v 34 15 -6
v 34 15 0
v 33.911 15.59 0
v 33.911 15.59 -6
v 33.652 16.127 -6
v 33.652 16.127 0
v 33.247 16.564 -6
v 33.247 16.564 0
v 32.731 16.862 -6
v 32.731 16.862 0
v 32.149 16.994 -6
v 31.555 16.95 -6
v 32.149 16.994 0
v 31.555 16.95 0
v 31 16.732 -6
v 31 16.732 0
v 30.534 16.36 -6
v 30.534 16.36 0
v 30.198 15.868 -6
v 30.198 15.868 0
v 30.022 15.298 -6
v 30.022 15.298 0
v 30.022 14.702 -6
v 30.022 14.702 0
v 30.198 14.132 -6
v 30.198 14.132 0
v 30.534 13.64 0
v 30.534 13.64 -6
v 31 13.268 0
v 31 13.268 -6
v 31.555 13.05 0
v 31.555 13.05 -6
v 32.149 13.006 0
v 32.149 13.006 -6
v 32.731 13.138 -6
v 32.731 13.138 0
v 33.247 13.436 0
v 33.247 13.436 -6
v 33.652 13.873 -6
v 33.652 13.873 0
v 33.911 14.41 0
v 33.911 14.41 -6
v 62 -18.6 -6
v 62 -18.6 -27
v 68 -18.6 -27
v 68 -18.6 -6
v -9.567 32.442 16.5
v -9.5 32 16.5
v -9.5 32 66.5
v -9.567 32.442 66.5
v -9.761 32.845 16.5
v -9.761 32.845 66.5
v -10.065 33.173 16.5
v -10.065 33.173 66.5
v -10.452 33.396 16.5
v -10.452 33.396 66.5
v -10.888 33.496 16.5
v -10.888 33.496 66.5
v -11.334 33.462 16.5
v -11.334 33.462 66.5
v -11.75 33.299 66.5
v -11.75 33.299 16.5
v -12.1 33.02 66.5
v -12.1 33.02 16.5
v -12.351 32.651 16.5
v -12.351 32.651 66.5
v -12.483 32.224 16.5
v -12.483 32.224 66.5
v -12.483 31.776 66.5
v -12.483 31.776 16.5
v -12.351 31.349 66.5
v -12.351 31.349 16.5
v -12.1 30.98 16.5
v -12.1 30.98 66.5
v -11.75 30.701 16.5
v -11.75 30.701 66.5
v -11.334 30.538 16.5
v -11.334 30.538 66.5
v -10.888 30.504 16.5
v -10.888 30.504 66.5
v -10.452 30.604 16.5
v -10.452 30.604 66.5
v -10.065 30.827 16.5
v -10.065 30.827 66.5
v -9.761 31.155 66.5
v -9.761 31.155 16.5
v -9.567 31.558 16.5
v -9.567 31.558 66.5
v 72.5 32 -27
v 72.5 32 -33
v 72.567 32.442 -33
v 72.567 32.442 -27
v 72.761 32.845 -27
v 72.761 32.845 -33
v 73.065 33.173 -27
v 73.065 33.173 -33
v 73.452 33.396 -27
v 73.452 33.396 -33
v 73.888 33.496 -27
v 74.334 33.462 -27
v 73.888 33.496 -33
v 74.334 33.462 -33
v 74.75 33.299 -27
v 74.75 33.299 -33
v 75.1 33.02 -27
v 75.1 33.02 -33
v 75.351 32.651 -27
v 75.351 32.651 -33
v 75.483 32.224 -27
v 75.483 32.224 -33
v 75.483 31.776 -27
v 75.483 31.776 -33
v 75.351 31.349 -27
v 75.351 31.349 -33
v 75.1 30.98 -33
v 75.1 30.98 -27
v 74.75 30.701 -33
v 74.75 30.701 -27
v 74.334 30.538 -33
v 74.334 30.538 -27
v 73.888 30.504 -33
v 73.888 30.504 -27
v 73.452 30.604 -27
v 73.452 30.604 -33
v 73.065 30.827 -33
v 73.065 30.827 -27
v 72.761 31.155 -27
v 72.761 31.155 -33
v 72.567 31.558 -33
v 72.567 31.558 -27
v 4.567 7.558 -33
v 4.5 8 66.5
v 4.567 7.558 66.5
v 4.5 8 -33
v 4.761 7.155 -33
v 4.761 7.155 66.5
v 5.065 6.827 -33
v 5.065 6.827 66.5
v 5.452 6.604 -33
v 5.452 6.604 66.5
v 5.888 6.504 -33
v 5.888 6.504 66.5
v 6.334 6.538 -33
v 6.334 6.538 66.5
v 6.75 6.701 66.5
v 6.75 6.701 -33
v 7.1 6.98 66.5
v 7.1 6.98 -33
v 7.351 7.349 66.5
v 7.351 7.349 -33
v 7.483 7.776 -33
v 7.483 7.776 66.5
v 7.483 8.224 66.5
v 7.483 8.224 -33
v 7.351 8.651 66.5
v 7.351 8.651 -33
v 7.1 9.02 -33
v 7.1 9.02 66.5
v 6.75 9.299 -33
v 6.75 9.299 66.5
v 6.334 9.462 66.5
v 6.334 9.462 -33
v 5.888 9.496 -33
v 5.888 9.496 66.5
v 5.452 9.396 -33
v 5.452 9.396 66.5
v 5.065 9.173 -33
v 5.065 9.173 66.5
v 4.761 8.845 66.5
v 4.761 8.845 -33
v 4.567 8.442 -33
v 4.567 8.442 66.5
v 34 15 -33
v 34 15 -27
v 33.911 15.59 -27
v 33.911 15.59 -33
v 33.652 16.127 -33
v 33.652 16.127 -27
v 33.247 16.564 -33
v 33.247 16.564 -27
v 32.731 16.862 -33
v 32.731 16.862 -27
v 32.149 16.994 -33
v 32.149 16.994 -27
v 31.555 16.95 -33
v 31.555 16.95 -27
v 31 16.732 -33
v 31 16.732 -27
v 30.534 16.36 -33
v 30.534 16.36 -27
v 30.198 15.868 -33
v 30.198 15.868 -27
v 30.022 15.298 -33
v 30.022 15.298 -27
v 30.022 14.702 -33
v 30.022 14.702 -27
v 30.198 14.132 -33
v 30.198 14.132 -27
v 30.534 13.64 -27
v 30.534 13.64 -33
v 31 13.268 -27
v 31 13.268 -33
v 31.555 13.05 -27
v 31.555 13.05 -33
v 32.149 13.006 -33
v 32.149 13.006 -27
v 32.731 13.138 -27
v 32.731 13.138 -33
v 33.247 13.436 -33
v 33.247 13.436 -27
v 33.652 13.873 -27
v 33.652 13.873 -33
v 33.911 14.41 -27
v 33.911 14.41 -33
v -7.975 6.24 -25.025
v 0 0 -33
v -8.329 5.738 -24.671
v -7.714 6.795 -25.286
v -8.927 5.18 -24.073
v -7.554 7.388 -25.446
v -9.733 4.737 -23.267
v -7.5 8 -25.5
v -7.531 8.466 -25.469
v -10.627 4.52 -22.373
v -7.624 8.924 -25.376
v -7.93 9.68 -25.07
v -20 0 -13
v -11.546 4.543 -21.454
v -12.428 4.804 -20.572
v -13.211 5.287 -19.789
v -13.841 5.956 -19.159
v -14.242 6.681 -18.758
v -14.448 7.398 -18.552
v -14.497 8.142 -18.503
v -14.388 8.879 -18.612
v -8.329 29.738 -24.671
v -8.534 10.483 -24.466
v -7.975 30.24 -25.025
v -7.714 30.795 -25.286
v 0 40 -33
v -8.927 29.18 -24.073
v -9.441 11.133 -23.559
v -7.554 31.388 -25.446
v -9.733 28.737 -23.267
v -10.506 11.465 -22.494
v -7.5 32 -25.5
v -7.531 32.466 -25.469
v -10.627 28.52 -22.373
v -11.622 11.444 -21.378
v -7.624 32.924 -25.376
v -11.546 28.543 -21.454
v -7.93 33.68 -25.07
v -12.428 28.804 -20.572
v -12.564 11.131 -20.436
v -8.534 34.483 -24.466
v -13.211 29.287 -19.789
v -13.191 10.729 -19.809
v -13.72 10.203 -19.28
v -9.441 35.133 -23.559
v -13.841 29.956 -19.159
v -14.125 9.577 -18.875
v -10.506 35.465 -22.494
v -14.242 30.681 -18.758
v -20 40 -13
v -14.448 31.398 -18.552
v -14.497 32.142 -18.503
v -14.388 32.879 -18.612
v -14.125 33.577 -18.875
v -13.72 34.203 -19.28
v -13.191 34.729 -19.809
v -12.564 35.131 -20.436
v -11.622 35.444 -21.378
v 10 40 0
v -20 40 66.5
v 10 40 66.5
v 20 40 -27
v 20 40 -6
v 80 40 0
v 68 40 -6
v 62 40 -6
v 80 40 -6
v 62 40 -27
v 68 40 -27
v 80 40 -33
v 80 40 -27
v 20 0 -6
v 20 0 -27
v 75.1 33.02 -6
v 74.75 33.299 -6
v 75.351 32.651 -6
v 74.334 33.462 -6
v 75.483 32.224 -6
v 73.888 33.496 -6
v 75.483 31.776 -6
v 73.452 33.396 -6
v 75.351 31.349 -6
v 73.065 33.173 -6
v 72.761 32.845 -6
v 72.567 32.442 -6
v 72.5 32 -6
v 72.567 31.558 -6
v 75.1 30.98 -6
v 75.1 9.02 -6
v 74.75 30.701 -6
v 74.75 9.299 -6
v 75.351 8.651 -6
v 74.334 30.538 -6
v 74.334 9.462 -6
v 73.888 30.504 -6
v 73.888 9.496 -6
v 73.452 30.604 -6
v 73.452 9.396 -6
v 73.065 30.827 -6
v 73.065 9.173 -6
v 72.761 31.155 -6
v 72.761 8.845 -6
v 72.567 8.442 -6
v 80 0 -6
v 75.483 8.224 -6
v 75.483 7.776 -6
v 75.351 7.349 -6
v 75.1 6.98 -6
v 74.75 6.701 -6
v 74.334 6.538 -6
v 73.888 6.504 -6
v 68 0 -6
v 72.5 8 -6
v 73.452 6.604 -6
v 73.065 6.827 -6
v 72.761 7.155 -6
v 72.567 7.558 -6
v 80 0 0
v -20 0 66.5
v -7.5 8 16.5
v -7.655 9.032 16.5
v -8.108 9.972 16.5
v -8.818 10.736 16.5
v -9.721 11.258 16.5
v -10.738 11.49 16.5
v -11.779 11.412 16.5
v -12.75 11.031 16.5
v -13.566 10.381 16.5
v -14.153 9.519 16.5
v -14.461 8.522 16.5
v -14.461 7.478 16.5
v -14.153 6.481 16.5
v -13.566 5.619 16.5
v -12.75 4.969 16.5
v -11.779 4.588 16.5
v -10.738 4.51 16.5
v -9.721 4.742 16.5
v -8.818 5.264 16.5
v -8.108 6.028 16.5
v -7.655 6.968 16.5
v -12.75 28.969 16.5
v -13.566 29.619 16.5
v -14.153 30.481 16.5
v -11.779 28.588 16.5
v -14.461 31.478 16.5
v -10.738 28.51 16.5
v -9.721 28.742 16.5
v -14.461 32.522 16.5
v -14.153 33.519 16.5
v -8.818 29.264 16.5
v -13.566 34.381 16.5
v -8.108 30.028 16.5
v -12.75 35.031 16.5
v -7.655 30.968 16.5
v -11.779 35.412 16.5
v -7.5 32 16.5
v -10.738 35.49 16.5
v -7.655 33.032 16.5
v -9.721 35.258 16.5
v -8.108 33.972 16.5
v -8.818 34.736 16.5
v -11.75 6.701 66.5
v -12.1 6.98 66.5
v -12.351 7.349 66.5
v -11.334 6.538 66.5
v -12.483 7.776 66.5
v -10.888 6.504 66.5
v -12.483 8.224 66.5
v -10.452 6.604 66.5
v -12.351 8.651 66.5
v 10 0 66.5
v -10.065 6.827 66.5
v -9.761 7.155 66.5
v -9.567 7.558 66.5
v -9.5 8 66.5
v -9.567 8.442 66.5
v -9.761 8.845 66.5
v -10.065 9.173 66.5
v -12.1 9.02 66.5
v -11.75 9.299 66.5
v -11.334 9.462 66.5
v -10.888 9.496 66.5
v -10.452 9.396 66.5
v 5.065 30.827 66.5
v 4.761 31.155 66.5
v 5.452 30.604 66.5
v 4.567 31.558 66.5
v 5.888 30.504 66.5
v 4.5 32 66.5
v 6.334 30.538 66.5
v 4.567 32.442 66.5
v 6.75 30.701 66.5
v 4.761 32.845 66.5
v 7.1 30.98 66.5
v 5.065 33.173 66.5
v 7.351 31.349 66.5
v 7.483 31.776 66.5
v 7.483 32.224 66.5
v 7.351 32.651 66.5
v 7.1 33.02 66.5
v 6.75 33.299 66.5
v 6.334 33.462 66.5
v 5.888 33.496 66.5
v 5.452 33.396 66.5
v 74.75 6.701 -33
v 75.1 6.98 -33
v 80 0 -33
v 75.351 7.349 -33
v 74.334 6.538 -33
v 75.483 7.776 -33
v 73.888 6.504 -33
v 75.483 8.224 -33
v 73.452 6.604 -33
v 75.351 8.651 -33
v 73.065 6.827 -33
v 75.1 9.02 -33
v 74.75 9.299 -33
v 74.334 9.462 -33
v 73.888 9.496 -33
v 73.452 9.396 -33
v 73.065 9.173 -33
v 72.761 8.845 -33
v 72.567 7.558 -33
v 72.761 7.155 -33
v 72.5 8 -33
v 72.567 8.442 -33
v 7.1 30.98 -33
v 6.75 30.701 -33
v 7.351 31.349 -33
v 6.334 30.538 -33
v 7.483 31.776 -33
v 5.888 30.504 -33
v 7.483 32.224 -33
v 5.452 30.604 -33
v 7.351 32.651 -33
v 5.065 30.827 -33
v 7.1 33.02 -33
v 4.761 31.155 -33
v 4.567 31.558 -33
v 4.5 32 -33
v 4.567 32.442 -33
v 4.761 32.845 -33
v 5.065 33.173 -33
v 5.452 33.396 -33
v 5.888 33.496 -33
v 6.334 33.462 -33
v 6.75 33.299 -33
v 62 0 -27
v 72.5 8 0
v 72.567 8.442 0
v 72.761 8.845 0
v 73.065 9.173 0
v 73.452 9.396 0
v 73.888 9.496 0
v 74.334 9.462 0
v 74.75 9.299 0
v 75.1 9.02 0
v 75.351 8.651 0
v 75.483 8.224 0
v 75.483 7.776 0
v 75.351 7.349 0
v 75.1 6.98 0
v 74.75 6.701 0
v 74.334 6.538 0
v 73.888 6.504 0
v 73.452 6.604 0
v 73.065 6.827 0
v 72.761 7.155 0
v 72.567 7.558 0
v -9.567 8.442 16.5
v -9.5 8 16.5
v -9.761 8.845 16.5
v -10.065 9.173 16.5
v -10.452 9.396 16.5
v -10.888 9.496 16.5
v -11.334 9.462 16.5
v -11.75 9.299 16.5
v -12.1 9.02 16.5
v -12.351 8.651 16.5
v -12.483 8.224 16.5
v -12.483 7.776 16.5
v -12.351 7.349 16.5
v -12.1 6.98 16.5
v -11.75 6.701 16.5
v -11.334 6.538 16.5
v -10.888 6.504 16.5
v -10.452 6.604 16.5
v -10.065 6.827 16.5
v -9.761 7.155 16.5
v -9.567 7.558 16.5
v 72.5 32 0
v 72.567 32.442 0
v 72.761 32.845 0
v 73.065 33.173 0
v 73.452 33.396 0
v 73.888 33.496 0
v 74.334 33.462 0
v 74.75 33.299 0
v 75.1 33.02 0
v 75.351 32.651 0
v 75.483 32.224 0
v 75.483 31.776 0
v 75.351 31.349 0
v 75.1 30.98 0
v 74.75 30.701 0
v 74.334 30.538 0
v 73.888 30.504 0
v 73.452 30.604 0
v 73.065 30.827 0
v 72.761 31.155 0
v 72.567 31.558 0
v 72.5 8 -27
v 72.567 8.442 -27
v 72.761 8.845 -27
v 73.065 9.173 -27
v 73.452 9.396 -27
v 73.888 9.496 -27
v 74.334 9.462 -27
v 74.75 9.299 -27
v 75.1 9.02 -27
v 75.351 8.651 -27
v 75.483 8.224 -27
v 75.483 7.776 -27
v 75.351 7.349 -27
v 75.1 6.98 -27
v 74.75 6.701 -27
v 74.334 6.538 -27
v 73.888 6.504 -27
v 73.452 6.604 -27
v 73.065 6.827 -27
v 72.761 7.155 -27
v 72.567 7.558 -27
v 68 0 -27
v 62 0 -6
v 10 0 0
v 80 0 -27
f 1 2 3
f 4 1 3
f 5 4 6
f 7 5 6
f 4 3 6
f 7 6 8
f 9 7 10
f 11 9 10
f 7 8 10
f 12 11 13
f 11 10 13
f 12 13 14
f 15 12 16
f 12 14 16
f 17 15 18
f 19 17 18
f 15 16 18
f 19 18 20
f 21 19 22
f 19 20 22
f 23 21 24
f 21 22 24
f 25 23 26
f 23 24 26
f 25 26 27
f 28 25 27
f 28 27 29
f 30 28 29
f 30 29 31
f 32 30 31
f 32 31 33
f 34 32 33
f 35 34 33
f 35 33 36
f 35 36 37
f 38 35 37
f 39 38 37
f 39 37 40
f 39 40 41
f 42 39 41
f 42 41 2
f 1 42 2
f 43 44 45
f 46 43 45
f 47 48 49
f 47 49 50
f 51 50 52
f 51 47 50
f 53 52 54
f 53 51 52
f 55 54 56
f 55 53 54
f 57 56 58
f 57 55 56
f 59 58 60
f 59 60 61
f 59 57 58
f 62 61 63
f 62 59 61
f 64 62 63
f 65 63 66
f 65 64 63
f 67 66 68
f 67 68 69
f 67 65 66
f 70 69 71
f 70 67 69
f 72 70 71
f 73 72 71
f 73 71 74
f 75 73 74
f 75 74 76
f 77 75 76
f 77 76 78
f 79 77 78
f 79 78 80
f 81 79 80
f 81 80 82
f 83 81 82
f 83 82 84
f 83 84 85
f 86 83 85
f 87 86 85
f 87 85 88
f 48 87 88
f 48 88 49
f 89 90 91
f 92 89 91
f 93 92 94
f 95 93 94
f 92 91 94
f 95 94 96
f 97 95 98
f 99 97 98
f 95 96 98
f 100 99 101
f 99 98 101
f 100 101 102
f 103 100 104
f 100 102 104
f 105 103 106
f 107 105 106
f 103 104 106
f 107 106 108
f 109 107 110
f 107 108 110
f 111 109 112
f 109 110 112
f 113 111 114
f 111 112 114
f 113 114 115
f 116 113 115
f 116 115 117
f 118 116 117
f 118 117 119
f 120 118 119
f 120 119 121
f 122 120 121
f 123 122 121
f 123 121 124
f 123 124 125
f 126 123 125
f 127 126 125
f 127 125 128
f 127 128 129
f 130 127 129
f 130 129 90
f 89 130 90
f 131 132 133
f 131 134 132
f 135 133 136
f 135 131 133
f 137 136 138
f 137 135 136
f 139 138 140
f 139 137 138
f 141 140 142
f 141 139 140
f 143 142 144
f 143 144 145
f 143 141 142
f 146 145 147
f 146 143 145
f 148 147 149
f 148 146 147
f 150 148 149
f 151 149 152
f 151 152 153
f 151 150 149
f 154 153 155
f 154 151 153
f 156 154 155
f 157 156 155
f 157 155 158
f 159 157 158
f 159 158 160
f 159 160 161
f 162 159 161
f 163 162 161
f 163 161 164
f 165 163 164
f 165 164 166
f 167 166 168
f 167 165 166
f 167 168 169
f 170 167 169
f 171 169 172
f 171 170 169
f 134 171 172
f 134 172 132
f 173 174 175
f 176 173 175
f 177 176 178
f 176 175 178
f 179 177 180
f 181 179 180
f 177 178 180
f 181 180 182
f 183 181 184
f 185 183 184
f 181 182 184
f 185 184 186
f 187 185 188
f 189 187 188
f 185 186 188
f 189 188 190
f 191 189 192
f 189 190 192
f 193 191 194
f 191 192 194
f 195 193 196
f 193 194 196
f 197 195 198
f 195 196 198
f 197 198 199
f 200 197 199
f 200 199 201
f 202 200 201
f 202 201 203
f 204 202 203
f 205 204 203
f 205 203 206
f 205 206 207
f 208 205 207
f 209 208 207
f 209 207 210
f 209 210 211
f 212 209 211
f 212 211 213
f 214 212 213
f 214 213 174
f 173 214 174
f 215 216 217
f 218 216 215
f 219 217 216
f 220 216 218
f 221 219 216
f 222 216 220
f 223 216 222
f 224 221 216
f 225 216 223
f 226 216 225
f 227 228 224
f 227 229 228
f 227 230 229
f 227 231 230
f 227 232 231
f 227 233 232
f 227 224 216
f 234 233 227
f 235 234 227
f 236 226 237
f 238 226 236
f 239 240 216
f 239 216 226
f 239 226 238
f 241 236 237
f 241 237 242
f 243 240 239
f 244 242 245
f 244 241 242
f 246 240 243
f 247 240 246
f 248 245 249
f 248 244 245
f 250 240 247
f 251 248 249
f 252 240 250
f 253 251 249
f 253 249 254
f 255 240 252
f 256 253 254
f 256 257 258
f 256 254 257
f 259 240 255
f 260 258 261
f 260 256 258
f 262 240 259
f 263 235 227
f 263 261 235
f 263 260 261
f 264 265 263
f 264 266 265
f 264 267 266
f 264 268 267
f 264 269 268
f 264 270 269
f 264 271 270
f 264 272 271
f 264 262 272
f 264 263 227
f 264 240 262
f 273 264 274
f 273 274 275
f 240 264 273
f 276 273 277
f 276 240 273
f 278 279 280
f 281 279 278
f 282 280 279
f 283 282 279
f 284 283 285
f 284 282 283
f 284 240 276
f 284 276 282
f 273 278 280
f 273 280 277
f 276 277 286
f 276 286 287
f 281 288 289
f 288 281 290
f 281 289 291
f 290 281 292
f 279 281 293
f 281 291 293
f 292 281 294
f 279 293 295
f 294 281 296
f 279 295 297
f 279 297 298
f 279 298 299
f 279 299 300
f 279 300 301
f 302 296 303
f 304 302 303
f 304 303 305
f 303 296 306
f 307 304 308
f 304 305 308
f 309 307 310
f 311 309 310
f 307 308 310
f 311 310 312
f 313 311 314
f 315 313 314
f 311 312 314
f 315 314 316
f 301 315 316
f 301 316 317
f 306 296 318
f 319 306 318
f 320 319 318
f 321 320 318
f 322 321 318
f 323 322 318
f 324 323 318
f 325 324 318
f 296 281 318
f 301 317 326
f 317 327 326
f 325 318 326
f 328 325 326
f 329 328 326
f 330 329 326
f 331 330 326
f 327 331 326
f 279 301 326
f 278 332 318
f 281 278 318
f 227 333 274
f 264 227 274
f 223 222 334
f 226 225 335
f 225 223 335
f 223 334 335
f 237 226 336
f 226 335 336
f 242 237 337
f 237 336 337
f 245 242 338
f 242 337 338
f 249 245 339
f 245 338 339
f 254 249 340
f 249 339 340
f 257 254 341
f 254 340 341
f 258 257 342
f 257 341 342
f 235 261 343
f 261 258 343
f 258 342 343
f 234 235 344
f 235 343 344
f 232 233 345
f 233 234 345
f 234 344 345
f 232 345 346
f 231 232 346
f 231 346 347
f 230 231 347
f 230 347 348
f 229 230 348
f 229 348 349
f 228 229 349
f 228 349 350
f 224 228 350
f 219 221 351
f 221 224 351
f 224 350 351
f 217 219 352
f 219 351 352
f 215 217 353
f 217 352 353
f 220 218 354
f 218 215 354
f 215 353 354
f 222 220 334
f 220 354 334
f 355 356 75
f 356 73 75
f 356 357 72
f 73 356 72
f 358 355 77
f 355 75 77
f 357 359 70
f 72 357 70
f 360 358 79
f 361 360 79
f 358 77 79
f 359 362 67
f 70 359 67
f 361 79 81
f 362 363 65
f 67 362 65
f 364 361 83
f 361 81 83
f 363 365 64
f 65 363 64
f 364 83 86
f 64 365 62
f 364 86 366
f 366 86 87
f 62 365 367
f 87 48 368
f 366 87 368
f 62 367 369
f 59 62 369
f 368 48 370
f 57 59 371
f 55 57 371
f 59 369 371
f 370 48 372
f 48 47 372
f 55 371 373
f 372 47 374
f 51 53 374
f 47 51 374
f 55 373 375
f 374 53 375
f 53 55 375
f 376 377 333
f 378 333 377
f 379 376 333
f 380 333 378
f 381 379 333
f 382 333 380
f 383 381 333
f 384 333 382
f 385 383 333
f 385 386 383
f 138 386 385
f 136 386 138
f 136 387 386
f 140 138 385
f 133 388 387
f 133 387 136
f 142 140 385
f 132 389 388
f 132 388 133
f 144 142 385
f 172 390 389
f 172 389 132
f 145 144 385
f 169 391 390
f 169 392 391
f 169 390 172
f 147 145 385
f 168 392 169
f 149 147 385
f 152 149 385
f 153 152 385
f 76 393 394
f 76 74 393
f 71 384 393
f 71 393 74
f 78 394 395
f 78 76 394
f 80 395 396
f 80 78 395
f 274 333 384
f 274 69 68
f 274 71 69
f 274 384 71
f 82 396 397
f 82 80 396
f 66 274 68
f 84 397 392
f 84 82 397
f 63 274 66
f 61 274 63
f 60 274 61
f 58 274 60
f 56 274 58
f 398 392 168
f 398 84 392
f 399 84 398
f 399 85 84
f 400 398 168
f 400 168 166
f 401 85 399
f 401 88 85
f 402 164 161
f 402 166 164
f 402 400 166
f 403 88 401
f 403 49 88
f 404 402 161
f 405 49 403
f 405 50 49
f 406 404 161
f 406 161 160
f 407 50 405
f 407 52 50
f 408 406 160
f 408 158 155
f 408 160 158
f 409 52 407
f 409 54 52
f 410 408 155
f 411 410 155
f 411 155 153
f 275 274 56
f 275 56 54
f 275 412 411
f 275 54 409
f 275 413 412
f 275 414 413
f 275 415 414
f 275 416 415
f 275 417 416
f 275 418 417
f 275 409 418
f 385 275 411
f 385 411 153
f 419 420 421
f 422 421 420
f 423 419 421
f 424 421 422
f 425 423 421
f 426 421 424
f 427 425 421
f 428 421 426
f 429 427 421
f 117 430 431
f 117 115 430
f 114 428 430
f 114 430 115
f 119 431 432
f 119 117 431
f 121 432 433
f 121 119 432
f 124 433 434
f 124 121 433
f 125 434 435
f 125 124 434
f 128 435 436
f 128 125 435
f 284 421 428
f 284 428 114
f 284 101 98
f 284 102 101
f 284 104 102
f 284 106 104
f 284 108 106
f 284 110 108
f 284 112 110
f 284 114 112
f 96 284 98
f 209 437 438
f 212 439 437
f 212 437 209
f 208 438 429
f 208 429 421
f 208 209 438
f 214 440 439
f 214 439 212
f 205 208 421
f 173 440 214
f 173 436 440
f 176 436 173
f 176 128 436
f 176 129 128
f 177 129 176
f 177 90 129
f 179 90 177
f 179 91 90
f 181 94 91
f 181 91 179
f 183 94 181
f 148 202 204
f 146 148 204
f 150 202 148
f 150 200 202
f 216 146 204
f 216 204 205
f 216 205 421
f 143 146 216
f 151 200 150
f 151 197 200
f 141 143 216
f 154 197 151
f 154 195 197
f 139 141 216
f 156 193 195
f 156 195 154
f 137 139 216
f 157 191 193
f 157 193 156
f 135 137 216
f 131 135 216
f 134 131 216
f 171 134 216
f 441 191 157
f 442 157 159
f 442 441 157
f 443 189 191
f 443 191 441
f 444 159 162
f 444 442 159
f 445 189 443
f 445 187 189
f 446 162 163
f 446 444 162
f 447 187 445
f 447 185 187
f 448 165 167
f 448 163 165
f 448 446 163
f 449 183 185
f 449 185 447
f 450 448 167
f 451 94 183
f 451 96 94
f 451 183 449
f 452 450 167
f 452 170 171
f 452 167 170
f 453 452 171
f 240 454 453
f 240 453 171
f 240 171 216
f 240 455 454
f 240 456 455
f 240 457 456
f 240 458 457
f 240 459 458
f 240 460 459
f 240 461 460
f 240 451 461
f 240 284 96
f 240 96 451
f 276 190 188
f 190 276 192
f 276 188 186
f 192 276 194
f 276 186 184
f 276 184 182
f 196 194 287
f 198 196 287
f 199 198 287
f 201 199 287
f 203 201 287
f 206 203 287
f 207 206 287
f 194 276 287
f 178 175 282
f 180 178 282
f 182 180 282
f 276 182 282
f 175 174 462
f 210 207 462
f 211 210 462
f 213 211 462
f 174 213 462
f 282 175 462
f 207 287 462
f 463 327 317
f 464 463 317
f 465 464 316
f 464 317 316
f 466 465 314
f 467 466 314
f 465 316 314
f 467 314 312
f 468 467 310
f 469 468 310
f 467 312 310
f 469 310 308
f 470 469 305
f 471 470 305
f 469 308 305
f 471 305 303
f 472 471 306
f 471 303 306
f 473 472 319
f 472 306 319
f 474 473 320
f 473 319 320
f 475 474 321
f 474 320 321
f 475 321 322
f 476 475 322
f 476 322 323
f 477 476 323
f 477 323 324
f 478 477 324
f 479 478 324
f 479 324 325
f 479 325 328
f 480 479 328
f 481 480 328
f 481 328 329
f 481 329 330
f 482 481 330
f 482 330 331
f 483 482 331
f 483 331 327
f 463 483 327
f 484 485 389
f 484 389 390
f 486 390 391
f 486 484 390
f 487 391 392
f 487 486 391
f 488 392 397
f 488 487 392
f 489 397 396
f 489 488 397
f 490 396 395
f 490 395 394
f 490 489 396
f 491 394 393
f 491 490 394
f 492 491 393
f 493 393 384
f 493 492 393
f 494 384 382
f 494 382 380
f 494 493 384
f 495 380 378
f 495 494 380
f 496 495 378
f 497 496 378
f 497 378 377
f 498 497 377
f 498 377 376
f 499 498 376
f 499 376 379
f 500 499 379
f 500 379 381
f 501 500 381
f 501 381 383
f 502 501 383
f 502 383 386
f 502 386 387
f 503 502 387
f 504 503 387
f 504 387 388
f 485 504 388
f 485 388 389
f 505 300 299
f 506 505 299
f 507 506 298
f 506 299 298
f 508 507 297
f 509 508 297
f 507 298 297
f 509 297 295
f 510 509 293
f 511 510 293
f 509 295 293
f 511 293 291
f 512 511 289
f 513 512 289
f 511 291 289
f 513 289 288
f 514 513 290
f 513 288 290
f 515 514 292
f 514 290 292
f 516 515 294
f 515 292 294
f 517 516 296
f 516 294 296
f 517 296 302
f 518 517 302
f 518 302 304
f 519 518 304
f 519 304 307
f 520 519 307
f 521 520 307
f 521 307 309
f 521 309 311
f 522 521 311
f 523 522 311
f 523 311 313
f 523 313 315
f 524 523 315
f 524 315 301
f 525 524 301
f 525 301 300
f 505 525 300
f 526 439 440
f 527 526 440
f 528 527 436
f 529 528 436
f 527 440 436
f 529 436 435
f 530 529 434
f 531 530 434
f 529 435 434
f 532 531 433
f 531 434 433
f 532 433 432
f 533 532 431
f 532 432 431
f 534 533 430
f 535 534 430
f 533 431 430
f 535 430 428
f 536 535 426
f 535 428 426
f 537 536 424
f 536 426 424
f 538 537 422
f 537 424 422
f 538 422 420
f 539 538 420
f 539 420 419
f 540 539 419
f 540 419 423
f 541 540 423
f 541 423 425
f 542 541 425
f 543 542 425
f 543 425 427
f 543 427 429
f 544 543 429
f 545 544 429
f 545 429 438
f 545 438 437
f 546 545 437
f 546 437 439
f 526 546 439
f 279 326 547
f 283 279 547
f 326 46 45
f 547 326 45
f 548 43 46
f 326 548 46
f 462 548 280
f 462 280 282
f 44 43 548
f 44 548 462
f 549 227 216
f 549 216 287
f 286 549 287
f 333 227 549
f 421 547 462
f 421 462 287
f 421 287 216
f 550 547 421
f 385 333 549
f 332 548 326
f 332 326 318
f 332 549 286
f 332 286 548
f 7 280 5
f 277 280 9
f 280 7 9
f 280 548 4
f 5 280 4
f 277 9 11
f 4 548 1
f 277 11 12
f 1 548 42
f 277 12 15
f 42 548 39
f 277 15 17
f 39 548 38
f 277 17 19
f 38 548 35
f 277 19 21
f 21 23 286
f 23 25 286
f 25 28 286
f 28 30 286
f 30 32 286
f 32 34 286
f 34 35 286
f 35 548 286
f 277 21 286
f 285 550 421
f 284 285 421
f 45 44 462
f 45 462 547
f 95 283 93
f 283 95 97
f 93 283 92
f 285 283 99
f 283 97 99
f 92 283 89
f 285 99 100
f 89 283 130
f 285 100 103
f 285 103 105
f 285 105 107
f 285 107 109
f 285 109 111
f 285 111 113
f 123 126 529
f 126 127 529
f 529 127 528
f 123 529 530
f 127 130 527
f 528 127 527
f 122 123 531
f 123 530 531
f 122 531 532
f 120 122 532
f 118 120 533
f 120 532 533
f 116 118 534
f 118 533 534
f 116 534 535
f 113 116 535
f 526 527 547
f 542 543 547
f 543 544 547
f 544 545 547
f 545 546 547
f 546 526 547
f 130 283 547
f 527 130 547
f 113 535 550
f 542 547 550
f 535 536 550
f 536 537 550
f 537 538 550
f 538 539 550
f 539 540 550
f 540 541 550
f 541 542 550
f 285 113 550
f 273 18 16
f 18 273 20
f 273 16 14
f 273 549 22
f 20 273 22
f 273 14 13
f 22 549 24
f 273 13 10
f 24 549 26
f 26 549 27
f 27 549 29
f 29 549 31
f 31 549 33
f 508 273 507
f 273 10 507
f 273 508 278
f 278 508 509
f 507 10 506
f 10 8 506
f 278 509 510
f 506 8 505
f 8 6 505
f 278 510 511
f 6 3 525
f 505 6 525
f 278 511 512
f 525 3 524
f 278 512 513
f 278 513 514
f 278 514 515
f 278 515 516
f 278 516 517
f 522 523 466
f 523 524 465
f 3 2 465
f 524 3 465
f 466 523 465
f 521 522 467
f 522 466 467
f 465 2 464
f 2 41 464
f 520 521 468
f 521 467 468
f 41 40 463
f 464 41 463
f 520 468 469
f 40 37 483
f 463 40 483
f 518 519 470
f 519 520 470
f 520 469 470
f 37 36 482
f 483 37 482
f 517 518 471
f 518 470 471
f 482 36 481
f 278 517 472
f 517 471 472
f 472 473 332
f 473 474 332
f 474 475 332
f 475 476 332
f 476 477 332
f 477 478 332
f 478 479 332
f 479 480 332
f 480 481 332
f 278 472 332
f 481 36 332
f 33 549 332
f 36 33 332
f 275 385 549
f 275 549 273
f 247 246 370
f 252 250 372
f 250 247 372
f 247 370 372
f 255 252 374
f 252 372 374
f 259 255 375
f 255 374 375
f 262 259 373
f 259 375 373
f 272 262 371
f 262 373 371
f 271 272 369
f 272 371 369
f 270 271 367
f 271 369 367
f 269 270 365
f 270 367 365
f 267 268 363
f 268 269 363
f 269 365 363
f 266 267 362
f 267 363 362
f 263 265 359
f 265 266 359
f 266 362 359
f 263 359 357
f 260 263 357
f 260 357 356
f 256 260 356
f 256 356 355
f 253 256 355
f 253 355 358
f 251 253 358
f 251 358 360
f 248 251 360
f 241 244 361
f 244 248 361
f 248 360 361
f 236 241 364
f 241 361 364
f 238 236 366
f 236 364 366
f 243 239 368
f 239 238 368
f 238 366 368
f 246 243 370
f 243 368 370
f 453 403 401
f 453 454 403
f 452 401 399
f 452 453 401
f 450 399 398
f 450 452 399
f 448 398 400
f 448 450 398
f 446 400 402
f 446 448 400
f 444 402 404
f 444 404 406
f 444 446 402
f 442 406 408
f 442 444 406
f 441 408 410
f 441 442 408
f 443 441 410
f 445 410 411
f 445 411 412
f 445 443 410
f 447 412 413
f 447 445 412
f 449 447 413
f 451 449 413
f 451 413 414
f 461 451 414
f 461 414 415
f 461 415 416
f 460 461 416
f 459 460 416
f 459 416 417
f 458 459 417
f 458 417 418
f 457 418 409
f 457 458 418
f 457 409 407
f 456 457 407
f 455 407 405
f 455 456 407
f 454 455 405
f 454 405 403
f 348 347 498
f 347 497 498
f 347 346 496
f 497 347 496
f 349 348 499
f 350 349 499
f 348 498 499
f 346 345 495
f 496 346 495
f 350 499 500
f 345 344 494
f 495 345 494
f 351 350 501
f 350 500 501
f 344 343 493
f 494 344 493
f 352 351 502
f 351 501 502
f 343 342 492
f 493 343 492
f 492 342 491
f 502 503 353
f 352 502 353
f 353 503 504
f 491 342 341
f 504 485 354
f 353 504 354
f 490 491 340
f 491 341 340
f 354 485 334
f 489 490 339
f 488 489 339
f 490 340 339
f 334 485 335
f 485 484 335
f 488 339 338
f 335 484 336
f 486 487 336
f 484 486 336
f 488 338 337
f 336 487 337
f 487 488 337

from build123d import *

# Parameters (mm, degrees)
EXTRUDE_1_DEPTH             = 40
SKETCH_8_R                  = 1.5
CUT_EXTRUDE_2_DEPTH         = 96.336247042
SKETCH_12_W                 = 30
SKETCH_12_H                 = 40
SKETCH_12_R                 = 1.5
EXTRUDE_7_DEPTH             = 66.5
EXTRUDE_7_DIRECTION_2_REACH = 97.336
CUT_EXTRUDE_3_DEPTH         = 112.45514793
CUT_EXTRUDE_START           = -50
SKETCH_15_R                 = 3.5
CUT_EXTRUDE_4_DEPTH         = 84.791815893
EXTRUDE_START               = -58.6
SKETCH_16_W                 = 6
SKETCH_16_H                 = 21
EXTRUDE_9_DEPTH             = 58.6
SKETCH_17_R                 = 2
CUT_EXTRUDE_5_DEPTH         = 112.45514793


with BuildPart() as part:
    # 草图1 → 凸台-拉伸1 (new body)
    with BuildSketch(Plane(origin=(0, 0, 0), x_dir=(1, 0, 0), z_dir=(0, 1, 0))):
        Polygon((0, 0), (80, 0), (80, 6), (20, 6), (20, 27), (80, 27), (80, 33), (0, 33), align=None)
    extrude(amount=EXTRUDE_1_DEPTH)

    # 草图8 → 切除-拉伸2 (cut, through all)
    with BuildSketch(Plane(origin=(0, 0, -33), x_dir=(-1, 0, 0), z_dir=(0, 0, -1))):
        with Locations((-74, 8)):
            Circle(SKETCH_8_R)
        with Locations((-74, 32)):
            Circle(SKETCH_8_R)
        with Locations((-6, 32)):
            Circle(SKETCH_8_R)
        with Locations((-6, 8)):
            Circle(SKETCH_8_R)
    extrude(amount=-CUT_EXTRUDE_2_DEPTH, mode=Mode.SUBTRACT)

    # 草图12 → 凸台-拉伸7 (add)
    with BuildSketch(Plane.XY):
        with Locations((-5, 20)):
            Rectangle(SKETCH_12_W, SKETCH_12_H)
        with Locations((-11, 32)):
            Circle(SKETCH_12_R, mode=Mode.SUBTRACT)
        with Locations((-11, 8)):
            Circle(SKETCH_12_R, mode=Mode.SUBTRACT)
        with Locations(Location((6, 8, 0), (0, 0, 180))):
            Circle(SKETCH_12_R, mode=Mode.SUBTRACT)
        with Locations(Location((6, 32, 0), (0, 0, 180))):
            Circle(SKETCH_12_R, mode=Mode.SUBTRACT)
    extrude(amount=EXTRUDE_7_DEPTH)

    # 凸台-拉伸7 direction 2: up to this face of the body (flat: up to its plane)
    extrude_7_direction_2_end = Plane(part.part.faces().sort_by_distance((40, 20, -33))[0])
    # 草图12 → 凸台-拉伸7 direction 2 (add, up to the picked face)
    with BuildSketch(Plane.XY, mode=Mode.PRIVATE) as extrude_7_direction_2_sk1:
        with Locations((-5, 20)):
            Rectangle(SKETCH_12_W, SKETCH_12_H)
        with Locations((-11, 32)):
            Circle(SKETCH_12_R, mode=Mode.SUBTRACT)
        with Locations((-11, 8)):
            Circle(SKETCH_12_R, mode=Mode.SUBTRACT)
        with Locations(Location((6, 8, 0), (0, 0, 180))):
            Circle(SKETCH_12_R, mode=Mode.SUBTRACT)
        with Locations(Location((6, 32, 0), (0, 0, 180))):
            Circle(SKETCH_12_R, mode=Mode.SUBTRACT)
    extrude_7_direction_2_tool1 = split(extrude(extrude_7_direction_2_sk1.sketch, amount=-EXTRUDE_7_DIRECTION_2_REACH, mode=Mode.PRIVATE), bisect_by=extrude_7_direction_2_end, keep=Keep.BOTH, mode=Mode.PRIVATE)
    add(extrude_7_direction_2_tool1.solids().sort_by(Axis((-5.060326, 20, 0), (0, 0, -1)))[0])

    # 草图14 → 切除-拉伸3 (cut, through all)
    with BuildSketch(Plane(origin=(0, 40, 0), x_dir=(1, 0, 0), z_dir=(0, 1, 0))):
        Polygon((-20, 33), (0, 33), (-20, 13), align=None)
    extrude(amount=-CUT_EXTRUDE_3_DEPTH, mode=Mode.SUBTRACT)

    # 草图15 → 切除-拉伸4 (cut, through all)
    with BuildSketch(Plane.XY.offset(66.5).offset(CUT_EXTRUDE_START)):
        with Locations((-11, 32)):
            Circle(SKETCH_15_R)
        with Locations((-11, 8)):
            Circle(SKETCH_15_R)
    extrude(amount=-CUT_EXTRUDE_4_DEPTH, mode=Mode.SUBTRACT)

    # 草图16 → 凸台-拉伸9 (add)
    with BuildSketch(Plane(origin=(0, 40, 0), x_dir=(1, 0, 0), z_dir=(0, 1, 0)).offset(EXTRUDE_START)):
        with Locations((65, 16.5)):
            Rectangle(SKETCH_16_W, SKETCH_16_H)
    extrude(amount=EXTRUDE_9_DEPTH)

    # 草图17 → 切除-拉伸5 (cut, through all)
    with BuildSketch(Plane.XY):
        with Locations((32, 15)):
            Circle(SKETCH_17_R)
    extrude(amount=-CUT_EXTRUDE_5_DEPTH, mode=Mode.SUBTRACT)


solid = part.part
